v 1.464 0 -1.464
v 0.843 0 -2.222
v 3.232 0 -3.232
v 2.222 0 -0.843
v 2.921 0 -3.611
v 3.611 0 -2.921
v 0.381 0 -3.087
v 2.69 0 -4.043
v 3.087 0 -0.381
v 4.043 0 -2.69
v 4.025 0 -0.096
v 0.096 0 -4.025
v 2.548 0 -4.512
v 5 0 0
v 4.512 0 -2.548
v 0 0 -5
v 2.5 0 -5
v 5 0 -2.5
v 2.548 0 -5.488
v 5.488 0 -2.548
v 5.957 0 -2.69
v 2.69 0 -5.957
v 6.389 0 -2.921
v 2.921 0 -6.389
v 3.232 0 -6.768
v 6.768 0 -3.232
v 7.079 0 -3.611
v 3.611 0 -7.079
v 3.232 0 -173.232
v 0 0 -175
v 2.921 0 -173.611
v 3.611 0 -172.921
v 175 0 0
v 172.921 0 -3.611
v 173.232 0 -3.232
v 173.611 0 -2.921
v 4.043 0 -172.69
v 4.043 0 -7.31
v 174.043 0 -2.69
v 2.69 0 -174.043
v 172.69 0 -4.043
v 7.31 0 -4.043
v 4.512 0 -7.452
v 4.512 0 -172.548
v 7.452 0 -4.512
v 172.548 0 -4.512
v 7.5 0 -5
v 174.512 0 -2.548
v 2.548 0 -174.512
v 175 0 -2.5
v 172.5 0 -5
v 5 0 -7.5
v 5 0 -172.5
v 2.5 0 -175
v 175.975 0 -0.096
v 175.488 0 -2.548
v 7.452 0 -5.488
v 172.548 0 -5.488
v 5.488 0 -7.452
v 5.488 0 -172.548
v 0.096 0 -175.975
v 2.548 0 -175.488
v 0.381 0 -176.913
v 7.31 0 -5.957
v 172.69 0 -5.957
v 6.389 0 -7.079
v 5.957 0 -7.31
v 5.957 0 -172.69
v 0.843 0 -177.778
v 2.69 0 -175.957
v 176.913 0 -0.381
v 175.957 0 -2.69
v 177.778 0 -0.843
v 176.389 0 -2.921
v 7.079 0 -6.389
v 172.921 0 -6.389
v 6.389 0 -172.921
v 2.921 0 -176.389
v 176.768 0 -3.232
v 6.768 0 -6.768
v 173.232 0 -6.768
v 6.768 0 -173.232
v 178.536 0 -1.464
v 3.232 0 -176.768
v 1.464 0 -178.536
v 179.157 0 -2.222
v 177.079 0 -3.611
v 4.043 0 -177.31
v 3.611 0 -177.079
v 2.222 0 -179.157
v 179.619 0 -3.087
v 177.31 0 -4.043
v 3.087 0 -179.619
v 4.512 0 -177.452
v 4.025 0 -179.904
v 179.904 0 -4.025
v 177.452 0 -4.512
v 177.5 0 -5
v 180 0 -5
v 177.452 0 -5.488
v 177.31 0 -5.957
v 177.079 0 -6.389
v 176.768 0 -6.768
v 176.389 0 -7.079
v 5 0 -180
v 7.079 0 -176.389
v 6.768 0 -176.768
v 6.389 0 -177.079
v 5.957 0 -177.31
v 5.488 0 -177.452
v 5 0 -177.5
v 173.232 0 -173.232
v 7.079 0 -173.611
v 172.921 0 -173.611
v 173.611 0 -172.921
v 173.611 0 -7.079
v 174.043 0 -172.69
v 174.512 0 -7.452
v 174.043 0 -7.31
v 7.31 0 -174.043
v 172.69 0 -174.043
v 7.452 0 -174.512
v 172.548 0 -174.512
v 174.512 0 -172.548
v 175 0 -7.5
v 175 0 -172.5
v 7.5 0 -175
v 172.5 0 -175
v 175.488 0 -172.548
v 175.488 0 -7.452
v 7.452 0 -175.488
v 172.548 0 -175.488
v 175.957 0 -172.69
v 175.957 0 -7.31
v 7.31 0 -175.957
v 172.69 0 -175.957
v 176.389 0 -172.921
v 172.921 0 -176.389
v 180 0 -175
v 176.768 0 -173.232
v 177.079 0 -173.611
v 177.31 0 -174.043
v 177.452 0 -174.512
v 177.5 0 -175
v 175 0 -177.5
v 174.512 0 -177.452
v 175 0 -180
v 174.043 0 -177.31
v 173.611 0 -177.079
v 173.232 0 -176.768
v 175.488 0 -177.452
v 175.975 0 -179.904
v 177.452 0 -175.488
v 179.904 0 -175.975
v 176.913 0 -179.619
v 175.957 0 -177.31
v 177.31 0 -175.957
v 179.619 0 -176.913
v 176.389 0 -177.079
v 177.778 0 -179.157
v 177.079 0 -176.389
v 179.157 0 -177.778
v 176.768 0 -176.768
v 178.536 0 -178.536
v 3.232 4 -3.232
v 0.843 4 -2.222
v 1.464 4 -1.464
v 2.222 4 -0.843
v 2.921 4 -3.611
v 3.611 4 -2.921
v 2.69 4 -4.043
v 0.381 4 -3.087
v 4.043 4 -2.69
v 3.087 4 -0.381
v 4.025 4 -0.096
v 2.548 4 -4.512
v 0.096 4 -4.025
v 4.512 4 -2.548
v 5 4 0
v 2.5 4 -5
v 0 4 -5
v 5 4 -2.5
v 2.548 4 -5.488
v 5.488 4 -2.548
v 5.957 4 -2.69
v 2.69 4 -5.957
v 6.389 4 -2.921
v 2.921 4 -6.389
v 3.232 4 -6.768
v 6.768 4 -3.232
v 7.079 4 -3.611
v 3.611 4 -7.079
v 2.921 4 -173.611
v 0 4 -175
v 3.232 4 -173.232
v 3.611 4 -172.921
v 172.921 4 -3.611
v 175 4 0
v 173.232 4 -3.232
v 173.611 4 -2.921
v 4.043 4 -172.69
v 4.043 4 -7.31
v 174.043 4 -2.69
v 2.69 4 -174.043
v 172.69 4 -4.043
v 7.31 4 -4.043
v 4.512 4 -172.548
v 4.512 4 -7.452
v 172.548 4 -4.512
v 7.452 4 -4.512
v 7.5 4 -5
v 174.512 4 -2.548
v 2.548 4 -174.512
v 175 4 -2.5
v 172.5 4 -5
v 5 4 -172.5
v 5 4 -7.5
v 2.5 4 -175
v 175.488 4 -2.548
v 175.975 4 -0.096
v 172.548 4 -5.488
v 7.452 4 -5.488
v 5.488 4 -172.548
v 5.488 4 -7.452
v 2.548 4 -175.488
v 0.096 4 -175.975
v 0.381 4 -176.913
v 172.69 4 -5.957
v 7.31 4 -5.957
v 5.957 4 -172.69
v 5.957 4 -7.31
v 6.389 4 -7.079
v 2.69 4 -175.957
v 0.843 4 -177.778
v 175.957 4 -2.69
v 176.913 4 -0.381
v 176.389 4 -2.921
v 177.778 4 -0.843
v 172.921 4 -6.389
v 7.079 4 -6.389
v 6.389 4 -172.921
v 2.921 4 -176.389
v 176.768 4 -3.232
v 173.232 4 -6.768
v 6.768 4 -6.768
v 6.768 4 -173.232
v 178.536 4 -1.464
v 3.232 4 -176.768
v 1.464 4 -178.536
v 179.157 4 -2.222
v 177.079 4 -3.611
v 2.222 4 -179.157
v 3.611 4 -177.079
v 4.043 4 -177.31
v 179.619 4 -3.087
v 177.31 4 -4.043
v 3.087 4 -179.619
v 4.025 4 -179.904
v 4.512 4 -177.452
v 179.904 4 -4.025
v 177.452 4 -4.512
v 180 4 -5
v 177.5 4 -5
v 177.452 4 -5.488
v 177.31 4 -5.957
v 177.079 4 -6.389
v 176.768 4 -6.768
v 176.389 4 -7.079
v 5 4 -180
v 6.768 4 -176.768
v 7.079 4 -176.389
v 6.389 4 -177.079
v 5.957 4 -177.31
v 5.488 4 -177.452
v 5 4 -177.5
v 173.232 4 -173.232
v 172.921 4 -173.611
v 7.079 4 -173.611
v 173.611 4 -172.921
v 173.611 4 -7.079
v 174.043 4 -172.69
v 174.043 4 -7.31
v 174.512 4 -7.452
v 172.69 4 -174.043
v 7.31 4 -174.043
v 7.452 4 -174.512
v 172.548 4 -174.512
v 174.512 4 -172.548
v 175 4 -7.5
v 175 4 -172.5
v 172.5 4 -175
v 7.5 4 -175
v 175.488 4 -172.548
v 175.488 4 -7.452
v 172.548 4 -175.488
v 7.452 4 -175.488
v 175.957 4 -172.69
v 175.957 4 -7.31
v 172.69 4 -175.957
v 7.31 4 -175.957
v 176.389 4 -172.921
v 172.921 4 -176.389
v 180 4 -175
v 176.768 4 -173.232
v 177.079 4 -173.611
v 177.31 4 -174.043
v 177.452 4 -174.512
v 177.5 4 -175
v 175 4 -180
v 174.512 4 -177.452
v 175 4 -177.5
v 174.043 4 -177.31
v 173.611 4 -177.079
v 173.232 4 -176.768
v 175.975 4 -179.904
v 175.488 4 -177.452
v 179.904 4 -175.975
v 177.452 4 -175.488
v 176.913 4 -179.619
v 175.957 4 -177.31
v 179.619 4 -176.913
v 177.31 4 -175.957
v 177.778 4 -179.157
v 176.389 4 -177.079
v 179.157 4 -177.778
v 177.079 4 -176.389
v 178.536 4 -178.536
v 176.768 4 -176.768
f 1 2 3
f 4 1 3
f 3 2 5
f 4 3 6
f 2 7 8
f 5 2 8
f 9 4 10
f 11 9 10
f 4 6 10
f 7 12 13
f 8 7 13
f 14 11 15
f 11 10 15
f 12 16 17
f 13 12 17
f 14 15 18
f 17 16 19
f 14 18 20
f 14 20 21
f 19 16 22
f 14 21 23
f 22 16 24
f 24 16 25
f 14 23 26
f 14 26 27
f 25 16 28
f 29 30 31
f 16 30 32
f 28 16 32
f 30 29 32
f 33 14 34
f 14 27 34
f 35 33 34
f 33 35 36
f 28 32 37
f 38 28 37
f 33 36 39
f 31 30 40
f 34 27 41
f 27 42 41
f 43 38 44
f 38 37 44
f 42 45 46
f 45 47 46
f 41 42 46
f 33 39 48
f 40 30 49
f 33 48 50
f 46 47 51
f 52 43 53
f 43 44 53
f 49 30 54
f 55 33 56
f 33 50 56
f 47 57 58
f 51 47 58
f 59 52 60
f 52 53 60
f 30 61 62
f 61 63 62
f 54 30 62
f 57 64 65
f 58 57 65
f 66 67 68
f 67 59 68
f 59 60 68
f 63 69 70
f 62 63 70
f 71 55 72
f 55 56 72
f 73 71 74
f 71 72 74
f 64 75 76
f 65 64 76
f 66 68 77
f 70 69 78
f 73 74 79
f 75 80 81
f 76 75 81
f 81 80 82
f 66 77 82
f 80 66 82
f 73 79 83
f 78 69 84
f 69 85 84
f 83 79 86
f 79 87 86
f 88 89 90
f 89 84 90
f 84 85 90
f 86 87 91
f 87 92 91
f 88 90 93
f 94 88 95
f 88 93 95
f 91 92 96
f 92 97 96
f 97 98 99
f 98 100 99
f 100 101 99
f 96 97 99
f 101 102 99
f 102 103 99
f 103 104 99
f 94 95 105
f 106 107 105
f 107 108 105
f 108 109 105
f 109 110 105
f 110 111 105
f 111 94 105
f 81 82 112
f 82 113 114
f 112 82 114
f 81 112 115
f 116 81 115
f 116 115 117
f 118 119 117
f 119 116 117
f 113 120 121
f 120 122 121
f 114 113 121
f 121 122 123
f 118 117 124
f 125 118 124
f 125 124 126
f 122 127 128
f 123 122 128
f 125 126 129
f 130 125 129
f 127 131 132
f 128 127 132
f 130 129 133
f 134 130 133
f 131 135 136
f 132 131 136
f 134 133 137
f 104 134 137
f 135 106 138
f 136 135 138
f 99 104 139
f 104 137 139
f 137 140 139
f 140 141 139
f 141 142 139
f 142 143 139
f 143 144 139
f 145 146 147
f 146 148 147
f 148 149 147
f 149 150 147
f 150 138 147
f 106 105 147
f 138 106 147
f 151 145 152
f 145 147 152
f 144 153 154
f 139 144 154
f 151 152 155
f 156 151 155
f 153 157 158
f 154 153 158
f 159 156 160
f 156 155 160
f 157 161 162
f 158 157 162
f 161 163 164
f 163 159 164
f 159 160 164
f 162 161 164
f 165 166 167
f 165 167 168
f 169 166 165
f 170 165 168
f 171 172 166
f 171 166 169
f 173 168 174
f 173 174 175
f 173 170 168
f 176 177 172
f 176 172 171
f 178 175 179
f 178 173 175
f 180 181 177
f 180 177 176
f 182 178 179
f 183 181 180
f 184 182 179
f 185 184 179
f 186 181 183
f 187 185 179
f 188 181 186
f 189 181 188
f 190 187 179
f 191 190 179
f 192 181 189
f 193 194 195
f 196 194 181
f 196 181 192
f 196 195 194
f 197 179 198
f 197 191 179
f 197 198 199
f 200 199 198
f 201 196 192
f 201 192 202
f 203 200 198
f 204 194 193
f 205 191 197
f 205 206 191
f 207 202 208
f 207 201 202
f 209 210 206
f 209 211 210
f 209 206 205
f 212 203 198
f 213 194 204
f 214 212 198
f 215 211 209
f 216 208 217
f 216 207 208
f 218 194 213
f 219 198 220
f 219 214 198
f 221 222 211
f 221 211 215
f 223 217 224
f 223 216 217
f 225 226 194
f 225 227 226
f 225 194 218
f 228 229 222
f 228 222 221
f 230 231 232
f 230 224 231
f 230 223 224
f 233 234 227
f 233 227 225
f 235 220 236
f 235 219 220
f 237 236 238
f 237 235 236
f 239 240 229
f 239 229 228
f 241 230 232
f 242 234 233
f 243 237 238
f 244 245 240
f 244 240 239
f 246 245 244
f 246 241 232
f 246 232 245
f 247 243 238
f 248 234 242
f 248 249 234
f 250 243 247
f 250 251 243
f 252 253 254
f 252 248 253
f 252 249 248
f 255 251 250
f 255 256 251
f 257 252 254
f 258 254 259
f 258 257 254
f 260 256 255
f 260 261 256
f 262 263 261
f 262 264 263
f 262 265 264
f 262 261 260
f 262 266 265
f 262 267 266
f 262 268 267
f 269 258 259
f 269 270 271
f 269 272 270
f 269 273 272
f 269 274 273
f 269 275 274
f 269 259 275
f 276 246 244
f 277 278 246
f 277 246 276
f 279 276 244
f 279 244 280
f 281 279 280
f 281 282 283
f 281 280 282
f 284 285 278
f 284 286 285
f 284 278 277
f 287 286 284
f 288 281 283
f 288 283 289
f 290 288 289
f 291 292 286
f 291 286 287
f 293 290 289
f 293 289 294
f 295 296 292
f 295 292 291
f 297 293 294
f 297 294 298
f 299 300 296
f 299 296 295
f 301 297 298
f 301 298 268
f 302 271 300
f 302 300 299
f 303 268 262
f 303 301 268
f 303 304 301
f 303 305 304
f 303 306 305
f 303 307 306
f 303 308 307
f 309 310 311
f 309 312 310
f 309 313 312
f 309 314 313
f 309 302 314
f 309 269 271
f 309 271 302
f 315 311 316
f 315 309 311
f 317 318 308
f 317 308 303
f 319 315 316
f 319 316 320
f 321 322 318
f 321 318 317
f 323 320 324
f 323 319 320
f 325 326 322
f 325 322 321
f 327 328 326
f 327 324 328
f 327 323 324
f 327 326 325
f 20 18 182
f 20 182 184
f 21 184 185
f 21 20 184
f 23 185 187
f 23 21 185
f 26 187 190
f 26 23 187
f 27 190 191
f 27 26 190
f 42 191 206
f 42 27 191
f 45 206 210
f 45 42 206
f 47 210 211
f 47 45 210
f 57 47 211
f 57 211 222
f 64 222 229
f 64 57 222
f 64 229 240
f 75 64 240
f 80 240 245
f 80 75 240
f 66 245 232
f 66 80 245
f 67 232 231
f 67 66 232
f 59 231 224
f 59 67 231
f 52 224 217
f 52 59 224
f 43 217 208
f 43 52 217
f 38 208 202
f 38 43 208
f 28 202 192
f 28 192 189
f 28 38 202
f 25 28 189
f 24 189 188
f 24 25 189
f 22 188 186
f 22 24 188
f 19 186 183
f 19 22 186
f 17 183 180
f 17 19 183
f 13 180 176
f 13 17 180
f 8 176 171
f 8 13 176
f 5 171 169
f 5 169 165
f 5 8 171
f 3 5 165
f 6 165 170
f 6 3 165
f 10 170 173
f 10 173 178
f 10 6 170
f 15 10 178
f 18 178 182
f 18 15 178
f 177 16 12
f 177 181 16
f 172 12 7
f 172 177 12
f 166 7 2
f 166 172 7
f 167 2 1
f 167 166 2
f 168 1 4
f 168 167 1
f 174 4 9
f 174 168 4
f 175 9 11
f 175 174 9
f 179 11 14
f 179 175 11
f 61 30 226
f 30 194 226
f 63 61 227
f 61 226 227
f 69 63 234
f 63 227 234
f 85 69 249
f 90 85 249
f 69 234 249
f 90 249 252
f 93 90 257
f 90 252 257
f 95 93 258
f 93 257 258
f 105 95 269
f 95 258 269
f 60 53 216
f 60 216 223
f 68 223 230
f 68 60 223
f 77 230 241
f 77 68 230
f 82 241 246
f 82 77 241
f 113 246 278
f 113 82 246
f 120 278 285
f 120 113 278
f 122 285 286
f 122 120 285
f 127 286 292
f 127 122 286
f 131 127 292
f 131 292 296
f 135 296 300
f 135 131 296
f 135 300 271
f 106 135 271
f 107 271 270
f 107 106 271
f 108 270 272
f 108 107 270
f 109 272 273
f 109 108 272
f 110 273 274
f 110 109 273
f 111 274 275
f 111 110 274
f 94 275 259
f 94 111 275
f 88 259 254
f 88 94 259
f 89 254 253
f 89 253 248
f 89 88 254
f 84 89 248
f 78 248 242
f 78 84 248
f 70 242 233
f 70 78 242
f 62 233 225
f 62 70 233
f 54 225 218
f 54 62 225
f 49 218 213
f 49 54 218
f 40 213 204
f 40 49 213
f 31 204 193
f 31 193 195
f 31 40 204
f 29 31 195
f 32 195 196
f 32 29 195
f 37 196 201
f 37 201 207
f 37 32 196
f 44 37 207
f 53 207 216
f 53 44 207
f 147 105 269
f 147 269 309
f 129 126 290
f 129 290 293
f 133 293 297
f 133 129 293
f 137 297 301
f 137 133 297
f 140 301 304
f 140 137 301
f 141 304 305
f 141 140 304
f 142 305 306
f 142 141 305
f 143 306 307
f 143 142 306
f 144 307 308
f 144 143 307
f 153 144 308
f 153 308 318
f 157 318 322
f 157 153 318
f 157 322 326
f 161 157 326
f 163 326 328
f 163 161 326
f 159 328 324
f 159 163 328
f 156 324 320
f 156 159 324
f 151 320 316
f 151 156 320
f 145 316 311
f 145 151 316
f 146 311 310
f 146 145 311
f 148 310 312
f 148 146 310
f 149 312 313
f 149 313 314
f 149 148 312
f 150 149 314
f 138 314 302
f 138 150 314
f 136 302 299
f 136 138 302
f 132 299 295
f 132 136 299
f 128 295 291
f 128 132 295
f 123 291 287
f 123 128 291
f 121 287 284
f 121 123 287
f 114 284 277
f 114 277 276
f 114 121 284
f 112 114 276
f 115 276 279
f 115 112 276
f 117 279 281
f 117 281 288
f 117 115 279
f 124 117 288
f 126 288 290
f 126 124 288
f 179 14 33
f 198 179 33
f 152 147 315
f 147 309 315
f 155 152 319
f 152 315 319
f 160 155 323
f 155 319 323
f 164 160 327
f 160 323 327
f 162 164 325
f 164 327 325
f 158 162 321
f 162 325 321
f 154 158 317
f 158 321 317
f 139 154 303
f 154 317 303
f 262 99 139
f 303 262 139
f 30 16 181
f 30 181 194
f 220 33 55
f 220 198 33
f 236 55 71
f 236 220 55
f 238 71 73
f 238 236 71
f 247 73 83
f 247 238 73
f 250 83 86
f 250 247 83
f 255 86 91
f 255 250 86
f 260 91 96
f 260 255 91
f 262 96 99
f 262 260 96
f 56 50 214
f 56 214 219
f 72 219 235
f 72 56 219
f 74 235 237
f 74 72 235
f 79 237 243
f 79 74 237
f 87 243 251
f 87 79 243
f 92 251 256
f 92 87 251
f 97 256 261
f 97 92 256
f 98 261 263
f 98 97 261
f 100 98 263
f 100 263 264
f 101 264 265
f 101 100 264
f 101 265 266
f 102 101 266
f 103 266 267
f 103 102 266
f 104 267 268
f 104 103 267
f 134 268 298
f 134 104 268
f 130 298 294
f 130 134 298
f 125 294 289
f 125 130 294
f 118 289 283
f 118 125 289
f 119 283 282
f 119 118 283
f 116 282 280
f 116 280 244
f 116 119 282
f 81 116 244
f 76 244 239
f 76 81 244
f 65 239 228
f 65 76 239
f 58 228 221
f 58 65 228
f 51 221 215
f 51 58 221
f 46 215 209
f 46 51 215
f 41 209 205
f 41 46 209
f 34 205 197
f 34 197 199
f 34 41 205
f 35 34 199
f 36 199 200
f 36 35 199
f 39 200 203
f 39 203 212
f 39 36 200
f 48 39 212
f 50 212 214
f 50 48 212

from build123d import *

# Parameters (mm, degrees)
CROQUIS1_W              = 180
CROQUIS1_H              = 180
CROQUIS1_R              = 2.5
SALIENTE_EXTRUIR1_DEPTH = 4
REDONDEO1_R             = 5


with BuildPart() as part:
    # Croquis1 → Saliente-Extruir1 (new body)
    with BuildSketch(Plane(origin=(0, 0, 0), x_dir=(1, 0, 0), z_dir=(0, 1, 0))):
        with Locations((90, 90)):
            Rectangle(CROQUIS1_W, CROQUIS1_H)
        with Locations(Location((5, 175, 0), (0, 0, 270))):
            Circle(CROQUIS1_R, mode=Mode.SUBTRACT)
        with Locations(Location((175, 175, 0), (0, 0, 270))):
            Circle(CROQUIS1_R, mode=Mode.SUBTRACT)
        with Locations(Location((175, 5, 0), (0, 0, 270))):
            Circle(CROQUIS1_R, mode=Mode.SUBTRACT)
        with Locations(Location((5, 5, 0), (0, 0, 270))):
            Circle(CROQUIS1_R, mode=Mode.SUBTRACT)
    extrude(amount=SALIENTE_EXTRUIR1_DEPTH)

    # Redondeo1
    redondeo1_edges = [part.edges().sort_by_distance(p)[0] for p in [
        (0, 2, -180),
        (180, 2, -180),
        (180, 2, 0),
        (0, 2, 0),
    ]]
    fillet(redondeo1_edges, radius=REDONDEO1_R)


solid = part.part
